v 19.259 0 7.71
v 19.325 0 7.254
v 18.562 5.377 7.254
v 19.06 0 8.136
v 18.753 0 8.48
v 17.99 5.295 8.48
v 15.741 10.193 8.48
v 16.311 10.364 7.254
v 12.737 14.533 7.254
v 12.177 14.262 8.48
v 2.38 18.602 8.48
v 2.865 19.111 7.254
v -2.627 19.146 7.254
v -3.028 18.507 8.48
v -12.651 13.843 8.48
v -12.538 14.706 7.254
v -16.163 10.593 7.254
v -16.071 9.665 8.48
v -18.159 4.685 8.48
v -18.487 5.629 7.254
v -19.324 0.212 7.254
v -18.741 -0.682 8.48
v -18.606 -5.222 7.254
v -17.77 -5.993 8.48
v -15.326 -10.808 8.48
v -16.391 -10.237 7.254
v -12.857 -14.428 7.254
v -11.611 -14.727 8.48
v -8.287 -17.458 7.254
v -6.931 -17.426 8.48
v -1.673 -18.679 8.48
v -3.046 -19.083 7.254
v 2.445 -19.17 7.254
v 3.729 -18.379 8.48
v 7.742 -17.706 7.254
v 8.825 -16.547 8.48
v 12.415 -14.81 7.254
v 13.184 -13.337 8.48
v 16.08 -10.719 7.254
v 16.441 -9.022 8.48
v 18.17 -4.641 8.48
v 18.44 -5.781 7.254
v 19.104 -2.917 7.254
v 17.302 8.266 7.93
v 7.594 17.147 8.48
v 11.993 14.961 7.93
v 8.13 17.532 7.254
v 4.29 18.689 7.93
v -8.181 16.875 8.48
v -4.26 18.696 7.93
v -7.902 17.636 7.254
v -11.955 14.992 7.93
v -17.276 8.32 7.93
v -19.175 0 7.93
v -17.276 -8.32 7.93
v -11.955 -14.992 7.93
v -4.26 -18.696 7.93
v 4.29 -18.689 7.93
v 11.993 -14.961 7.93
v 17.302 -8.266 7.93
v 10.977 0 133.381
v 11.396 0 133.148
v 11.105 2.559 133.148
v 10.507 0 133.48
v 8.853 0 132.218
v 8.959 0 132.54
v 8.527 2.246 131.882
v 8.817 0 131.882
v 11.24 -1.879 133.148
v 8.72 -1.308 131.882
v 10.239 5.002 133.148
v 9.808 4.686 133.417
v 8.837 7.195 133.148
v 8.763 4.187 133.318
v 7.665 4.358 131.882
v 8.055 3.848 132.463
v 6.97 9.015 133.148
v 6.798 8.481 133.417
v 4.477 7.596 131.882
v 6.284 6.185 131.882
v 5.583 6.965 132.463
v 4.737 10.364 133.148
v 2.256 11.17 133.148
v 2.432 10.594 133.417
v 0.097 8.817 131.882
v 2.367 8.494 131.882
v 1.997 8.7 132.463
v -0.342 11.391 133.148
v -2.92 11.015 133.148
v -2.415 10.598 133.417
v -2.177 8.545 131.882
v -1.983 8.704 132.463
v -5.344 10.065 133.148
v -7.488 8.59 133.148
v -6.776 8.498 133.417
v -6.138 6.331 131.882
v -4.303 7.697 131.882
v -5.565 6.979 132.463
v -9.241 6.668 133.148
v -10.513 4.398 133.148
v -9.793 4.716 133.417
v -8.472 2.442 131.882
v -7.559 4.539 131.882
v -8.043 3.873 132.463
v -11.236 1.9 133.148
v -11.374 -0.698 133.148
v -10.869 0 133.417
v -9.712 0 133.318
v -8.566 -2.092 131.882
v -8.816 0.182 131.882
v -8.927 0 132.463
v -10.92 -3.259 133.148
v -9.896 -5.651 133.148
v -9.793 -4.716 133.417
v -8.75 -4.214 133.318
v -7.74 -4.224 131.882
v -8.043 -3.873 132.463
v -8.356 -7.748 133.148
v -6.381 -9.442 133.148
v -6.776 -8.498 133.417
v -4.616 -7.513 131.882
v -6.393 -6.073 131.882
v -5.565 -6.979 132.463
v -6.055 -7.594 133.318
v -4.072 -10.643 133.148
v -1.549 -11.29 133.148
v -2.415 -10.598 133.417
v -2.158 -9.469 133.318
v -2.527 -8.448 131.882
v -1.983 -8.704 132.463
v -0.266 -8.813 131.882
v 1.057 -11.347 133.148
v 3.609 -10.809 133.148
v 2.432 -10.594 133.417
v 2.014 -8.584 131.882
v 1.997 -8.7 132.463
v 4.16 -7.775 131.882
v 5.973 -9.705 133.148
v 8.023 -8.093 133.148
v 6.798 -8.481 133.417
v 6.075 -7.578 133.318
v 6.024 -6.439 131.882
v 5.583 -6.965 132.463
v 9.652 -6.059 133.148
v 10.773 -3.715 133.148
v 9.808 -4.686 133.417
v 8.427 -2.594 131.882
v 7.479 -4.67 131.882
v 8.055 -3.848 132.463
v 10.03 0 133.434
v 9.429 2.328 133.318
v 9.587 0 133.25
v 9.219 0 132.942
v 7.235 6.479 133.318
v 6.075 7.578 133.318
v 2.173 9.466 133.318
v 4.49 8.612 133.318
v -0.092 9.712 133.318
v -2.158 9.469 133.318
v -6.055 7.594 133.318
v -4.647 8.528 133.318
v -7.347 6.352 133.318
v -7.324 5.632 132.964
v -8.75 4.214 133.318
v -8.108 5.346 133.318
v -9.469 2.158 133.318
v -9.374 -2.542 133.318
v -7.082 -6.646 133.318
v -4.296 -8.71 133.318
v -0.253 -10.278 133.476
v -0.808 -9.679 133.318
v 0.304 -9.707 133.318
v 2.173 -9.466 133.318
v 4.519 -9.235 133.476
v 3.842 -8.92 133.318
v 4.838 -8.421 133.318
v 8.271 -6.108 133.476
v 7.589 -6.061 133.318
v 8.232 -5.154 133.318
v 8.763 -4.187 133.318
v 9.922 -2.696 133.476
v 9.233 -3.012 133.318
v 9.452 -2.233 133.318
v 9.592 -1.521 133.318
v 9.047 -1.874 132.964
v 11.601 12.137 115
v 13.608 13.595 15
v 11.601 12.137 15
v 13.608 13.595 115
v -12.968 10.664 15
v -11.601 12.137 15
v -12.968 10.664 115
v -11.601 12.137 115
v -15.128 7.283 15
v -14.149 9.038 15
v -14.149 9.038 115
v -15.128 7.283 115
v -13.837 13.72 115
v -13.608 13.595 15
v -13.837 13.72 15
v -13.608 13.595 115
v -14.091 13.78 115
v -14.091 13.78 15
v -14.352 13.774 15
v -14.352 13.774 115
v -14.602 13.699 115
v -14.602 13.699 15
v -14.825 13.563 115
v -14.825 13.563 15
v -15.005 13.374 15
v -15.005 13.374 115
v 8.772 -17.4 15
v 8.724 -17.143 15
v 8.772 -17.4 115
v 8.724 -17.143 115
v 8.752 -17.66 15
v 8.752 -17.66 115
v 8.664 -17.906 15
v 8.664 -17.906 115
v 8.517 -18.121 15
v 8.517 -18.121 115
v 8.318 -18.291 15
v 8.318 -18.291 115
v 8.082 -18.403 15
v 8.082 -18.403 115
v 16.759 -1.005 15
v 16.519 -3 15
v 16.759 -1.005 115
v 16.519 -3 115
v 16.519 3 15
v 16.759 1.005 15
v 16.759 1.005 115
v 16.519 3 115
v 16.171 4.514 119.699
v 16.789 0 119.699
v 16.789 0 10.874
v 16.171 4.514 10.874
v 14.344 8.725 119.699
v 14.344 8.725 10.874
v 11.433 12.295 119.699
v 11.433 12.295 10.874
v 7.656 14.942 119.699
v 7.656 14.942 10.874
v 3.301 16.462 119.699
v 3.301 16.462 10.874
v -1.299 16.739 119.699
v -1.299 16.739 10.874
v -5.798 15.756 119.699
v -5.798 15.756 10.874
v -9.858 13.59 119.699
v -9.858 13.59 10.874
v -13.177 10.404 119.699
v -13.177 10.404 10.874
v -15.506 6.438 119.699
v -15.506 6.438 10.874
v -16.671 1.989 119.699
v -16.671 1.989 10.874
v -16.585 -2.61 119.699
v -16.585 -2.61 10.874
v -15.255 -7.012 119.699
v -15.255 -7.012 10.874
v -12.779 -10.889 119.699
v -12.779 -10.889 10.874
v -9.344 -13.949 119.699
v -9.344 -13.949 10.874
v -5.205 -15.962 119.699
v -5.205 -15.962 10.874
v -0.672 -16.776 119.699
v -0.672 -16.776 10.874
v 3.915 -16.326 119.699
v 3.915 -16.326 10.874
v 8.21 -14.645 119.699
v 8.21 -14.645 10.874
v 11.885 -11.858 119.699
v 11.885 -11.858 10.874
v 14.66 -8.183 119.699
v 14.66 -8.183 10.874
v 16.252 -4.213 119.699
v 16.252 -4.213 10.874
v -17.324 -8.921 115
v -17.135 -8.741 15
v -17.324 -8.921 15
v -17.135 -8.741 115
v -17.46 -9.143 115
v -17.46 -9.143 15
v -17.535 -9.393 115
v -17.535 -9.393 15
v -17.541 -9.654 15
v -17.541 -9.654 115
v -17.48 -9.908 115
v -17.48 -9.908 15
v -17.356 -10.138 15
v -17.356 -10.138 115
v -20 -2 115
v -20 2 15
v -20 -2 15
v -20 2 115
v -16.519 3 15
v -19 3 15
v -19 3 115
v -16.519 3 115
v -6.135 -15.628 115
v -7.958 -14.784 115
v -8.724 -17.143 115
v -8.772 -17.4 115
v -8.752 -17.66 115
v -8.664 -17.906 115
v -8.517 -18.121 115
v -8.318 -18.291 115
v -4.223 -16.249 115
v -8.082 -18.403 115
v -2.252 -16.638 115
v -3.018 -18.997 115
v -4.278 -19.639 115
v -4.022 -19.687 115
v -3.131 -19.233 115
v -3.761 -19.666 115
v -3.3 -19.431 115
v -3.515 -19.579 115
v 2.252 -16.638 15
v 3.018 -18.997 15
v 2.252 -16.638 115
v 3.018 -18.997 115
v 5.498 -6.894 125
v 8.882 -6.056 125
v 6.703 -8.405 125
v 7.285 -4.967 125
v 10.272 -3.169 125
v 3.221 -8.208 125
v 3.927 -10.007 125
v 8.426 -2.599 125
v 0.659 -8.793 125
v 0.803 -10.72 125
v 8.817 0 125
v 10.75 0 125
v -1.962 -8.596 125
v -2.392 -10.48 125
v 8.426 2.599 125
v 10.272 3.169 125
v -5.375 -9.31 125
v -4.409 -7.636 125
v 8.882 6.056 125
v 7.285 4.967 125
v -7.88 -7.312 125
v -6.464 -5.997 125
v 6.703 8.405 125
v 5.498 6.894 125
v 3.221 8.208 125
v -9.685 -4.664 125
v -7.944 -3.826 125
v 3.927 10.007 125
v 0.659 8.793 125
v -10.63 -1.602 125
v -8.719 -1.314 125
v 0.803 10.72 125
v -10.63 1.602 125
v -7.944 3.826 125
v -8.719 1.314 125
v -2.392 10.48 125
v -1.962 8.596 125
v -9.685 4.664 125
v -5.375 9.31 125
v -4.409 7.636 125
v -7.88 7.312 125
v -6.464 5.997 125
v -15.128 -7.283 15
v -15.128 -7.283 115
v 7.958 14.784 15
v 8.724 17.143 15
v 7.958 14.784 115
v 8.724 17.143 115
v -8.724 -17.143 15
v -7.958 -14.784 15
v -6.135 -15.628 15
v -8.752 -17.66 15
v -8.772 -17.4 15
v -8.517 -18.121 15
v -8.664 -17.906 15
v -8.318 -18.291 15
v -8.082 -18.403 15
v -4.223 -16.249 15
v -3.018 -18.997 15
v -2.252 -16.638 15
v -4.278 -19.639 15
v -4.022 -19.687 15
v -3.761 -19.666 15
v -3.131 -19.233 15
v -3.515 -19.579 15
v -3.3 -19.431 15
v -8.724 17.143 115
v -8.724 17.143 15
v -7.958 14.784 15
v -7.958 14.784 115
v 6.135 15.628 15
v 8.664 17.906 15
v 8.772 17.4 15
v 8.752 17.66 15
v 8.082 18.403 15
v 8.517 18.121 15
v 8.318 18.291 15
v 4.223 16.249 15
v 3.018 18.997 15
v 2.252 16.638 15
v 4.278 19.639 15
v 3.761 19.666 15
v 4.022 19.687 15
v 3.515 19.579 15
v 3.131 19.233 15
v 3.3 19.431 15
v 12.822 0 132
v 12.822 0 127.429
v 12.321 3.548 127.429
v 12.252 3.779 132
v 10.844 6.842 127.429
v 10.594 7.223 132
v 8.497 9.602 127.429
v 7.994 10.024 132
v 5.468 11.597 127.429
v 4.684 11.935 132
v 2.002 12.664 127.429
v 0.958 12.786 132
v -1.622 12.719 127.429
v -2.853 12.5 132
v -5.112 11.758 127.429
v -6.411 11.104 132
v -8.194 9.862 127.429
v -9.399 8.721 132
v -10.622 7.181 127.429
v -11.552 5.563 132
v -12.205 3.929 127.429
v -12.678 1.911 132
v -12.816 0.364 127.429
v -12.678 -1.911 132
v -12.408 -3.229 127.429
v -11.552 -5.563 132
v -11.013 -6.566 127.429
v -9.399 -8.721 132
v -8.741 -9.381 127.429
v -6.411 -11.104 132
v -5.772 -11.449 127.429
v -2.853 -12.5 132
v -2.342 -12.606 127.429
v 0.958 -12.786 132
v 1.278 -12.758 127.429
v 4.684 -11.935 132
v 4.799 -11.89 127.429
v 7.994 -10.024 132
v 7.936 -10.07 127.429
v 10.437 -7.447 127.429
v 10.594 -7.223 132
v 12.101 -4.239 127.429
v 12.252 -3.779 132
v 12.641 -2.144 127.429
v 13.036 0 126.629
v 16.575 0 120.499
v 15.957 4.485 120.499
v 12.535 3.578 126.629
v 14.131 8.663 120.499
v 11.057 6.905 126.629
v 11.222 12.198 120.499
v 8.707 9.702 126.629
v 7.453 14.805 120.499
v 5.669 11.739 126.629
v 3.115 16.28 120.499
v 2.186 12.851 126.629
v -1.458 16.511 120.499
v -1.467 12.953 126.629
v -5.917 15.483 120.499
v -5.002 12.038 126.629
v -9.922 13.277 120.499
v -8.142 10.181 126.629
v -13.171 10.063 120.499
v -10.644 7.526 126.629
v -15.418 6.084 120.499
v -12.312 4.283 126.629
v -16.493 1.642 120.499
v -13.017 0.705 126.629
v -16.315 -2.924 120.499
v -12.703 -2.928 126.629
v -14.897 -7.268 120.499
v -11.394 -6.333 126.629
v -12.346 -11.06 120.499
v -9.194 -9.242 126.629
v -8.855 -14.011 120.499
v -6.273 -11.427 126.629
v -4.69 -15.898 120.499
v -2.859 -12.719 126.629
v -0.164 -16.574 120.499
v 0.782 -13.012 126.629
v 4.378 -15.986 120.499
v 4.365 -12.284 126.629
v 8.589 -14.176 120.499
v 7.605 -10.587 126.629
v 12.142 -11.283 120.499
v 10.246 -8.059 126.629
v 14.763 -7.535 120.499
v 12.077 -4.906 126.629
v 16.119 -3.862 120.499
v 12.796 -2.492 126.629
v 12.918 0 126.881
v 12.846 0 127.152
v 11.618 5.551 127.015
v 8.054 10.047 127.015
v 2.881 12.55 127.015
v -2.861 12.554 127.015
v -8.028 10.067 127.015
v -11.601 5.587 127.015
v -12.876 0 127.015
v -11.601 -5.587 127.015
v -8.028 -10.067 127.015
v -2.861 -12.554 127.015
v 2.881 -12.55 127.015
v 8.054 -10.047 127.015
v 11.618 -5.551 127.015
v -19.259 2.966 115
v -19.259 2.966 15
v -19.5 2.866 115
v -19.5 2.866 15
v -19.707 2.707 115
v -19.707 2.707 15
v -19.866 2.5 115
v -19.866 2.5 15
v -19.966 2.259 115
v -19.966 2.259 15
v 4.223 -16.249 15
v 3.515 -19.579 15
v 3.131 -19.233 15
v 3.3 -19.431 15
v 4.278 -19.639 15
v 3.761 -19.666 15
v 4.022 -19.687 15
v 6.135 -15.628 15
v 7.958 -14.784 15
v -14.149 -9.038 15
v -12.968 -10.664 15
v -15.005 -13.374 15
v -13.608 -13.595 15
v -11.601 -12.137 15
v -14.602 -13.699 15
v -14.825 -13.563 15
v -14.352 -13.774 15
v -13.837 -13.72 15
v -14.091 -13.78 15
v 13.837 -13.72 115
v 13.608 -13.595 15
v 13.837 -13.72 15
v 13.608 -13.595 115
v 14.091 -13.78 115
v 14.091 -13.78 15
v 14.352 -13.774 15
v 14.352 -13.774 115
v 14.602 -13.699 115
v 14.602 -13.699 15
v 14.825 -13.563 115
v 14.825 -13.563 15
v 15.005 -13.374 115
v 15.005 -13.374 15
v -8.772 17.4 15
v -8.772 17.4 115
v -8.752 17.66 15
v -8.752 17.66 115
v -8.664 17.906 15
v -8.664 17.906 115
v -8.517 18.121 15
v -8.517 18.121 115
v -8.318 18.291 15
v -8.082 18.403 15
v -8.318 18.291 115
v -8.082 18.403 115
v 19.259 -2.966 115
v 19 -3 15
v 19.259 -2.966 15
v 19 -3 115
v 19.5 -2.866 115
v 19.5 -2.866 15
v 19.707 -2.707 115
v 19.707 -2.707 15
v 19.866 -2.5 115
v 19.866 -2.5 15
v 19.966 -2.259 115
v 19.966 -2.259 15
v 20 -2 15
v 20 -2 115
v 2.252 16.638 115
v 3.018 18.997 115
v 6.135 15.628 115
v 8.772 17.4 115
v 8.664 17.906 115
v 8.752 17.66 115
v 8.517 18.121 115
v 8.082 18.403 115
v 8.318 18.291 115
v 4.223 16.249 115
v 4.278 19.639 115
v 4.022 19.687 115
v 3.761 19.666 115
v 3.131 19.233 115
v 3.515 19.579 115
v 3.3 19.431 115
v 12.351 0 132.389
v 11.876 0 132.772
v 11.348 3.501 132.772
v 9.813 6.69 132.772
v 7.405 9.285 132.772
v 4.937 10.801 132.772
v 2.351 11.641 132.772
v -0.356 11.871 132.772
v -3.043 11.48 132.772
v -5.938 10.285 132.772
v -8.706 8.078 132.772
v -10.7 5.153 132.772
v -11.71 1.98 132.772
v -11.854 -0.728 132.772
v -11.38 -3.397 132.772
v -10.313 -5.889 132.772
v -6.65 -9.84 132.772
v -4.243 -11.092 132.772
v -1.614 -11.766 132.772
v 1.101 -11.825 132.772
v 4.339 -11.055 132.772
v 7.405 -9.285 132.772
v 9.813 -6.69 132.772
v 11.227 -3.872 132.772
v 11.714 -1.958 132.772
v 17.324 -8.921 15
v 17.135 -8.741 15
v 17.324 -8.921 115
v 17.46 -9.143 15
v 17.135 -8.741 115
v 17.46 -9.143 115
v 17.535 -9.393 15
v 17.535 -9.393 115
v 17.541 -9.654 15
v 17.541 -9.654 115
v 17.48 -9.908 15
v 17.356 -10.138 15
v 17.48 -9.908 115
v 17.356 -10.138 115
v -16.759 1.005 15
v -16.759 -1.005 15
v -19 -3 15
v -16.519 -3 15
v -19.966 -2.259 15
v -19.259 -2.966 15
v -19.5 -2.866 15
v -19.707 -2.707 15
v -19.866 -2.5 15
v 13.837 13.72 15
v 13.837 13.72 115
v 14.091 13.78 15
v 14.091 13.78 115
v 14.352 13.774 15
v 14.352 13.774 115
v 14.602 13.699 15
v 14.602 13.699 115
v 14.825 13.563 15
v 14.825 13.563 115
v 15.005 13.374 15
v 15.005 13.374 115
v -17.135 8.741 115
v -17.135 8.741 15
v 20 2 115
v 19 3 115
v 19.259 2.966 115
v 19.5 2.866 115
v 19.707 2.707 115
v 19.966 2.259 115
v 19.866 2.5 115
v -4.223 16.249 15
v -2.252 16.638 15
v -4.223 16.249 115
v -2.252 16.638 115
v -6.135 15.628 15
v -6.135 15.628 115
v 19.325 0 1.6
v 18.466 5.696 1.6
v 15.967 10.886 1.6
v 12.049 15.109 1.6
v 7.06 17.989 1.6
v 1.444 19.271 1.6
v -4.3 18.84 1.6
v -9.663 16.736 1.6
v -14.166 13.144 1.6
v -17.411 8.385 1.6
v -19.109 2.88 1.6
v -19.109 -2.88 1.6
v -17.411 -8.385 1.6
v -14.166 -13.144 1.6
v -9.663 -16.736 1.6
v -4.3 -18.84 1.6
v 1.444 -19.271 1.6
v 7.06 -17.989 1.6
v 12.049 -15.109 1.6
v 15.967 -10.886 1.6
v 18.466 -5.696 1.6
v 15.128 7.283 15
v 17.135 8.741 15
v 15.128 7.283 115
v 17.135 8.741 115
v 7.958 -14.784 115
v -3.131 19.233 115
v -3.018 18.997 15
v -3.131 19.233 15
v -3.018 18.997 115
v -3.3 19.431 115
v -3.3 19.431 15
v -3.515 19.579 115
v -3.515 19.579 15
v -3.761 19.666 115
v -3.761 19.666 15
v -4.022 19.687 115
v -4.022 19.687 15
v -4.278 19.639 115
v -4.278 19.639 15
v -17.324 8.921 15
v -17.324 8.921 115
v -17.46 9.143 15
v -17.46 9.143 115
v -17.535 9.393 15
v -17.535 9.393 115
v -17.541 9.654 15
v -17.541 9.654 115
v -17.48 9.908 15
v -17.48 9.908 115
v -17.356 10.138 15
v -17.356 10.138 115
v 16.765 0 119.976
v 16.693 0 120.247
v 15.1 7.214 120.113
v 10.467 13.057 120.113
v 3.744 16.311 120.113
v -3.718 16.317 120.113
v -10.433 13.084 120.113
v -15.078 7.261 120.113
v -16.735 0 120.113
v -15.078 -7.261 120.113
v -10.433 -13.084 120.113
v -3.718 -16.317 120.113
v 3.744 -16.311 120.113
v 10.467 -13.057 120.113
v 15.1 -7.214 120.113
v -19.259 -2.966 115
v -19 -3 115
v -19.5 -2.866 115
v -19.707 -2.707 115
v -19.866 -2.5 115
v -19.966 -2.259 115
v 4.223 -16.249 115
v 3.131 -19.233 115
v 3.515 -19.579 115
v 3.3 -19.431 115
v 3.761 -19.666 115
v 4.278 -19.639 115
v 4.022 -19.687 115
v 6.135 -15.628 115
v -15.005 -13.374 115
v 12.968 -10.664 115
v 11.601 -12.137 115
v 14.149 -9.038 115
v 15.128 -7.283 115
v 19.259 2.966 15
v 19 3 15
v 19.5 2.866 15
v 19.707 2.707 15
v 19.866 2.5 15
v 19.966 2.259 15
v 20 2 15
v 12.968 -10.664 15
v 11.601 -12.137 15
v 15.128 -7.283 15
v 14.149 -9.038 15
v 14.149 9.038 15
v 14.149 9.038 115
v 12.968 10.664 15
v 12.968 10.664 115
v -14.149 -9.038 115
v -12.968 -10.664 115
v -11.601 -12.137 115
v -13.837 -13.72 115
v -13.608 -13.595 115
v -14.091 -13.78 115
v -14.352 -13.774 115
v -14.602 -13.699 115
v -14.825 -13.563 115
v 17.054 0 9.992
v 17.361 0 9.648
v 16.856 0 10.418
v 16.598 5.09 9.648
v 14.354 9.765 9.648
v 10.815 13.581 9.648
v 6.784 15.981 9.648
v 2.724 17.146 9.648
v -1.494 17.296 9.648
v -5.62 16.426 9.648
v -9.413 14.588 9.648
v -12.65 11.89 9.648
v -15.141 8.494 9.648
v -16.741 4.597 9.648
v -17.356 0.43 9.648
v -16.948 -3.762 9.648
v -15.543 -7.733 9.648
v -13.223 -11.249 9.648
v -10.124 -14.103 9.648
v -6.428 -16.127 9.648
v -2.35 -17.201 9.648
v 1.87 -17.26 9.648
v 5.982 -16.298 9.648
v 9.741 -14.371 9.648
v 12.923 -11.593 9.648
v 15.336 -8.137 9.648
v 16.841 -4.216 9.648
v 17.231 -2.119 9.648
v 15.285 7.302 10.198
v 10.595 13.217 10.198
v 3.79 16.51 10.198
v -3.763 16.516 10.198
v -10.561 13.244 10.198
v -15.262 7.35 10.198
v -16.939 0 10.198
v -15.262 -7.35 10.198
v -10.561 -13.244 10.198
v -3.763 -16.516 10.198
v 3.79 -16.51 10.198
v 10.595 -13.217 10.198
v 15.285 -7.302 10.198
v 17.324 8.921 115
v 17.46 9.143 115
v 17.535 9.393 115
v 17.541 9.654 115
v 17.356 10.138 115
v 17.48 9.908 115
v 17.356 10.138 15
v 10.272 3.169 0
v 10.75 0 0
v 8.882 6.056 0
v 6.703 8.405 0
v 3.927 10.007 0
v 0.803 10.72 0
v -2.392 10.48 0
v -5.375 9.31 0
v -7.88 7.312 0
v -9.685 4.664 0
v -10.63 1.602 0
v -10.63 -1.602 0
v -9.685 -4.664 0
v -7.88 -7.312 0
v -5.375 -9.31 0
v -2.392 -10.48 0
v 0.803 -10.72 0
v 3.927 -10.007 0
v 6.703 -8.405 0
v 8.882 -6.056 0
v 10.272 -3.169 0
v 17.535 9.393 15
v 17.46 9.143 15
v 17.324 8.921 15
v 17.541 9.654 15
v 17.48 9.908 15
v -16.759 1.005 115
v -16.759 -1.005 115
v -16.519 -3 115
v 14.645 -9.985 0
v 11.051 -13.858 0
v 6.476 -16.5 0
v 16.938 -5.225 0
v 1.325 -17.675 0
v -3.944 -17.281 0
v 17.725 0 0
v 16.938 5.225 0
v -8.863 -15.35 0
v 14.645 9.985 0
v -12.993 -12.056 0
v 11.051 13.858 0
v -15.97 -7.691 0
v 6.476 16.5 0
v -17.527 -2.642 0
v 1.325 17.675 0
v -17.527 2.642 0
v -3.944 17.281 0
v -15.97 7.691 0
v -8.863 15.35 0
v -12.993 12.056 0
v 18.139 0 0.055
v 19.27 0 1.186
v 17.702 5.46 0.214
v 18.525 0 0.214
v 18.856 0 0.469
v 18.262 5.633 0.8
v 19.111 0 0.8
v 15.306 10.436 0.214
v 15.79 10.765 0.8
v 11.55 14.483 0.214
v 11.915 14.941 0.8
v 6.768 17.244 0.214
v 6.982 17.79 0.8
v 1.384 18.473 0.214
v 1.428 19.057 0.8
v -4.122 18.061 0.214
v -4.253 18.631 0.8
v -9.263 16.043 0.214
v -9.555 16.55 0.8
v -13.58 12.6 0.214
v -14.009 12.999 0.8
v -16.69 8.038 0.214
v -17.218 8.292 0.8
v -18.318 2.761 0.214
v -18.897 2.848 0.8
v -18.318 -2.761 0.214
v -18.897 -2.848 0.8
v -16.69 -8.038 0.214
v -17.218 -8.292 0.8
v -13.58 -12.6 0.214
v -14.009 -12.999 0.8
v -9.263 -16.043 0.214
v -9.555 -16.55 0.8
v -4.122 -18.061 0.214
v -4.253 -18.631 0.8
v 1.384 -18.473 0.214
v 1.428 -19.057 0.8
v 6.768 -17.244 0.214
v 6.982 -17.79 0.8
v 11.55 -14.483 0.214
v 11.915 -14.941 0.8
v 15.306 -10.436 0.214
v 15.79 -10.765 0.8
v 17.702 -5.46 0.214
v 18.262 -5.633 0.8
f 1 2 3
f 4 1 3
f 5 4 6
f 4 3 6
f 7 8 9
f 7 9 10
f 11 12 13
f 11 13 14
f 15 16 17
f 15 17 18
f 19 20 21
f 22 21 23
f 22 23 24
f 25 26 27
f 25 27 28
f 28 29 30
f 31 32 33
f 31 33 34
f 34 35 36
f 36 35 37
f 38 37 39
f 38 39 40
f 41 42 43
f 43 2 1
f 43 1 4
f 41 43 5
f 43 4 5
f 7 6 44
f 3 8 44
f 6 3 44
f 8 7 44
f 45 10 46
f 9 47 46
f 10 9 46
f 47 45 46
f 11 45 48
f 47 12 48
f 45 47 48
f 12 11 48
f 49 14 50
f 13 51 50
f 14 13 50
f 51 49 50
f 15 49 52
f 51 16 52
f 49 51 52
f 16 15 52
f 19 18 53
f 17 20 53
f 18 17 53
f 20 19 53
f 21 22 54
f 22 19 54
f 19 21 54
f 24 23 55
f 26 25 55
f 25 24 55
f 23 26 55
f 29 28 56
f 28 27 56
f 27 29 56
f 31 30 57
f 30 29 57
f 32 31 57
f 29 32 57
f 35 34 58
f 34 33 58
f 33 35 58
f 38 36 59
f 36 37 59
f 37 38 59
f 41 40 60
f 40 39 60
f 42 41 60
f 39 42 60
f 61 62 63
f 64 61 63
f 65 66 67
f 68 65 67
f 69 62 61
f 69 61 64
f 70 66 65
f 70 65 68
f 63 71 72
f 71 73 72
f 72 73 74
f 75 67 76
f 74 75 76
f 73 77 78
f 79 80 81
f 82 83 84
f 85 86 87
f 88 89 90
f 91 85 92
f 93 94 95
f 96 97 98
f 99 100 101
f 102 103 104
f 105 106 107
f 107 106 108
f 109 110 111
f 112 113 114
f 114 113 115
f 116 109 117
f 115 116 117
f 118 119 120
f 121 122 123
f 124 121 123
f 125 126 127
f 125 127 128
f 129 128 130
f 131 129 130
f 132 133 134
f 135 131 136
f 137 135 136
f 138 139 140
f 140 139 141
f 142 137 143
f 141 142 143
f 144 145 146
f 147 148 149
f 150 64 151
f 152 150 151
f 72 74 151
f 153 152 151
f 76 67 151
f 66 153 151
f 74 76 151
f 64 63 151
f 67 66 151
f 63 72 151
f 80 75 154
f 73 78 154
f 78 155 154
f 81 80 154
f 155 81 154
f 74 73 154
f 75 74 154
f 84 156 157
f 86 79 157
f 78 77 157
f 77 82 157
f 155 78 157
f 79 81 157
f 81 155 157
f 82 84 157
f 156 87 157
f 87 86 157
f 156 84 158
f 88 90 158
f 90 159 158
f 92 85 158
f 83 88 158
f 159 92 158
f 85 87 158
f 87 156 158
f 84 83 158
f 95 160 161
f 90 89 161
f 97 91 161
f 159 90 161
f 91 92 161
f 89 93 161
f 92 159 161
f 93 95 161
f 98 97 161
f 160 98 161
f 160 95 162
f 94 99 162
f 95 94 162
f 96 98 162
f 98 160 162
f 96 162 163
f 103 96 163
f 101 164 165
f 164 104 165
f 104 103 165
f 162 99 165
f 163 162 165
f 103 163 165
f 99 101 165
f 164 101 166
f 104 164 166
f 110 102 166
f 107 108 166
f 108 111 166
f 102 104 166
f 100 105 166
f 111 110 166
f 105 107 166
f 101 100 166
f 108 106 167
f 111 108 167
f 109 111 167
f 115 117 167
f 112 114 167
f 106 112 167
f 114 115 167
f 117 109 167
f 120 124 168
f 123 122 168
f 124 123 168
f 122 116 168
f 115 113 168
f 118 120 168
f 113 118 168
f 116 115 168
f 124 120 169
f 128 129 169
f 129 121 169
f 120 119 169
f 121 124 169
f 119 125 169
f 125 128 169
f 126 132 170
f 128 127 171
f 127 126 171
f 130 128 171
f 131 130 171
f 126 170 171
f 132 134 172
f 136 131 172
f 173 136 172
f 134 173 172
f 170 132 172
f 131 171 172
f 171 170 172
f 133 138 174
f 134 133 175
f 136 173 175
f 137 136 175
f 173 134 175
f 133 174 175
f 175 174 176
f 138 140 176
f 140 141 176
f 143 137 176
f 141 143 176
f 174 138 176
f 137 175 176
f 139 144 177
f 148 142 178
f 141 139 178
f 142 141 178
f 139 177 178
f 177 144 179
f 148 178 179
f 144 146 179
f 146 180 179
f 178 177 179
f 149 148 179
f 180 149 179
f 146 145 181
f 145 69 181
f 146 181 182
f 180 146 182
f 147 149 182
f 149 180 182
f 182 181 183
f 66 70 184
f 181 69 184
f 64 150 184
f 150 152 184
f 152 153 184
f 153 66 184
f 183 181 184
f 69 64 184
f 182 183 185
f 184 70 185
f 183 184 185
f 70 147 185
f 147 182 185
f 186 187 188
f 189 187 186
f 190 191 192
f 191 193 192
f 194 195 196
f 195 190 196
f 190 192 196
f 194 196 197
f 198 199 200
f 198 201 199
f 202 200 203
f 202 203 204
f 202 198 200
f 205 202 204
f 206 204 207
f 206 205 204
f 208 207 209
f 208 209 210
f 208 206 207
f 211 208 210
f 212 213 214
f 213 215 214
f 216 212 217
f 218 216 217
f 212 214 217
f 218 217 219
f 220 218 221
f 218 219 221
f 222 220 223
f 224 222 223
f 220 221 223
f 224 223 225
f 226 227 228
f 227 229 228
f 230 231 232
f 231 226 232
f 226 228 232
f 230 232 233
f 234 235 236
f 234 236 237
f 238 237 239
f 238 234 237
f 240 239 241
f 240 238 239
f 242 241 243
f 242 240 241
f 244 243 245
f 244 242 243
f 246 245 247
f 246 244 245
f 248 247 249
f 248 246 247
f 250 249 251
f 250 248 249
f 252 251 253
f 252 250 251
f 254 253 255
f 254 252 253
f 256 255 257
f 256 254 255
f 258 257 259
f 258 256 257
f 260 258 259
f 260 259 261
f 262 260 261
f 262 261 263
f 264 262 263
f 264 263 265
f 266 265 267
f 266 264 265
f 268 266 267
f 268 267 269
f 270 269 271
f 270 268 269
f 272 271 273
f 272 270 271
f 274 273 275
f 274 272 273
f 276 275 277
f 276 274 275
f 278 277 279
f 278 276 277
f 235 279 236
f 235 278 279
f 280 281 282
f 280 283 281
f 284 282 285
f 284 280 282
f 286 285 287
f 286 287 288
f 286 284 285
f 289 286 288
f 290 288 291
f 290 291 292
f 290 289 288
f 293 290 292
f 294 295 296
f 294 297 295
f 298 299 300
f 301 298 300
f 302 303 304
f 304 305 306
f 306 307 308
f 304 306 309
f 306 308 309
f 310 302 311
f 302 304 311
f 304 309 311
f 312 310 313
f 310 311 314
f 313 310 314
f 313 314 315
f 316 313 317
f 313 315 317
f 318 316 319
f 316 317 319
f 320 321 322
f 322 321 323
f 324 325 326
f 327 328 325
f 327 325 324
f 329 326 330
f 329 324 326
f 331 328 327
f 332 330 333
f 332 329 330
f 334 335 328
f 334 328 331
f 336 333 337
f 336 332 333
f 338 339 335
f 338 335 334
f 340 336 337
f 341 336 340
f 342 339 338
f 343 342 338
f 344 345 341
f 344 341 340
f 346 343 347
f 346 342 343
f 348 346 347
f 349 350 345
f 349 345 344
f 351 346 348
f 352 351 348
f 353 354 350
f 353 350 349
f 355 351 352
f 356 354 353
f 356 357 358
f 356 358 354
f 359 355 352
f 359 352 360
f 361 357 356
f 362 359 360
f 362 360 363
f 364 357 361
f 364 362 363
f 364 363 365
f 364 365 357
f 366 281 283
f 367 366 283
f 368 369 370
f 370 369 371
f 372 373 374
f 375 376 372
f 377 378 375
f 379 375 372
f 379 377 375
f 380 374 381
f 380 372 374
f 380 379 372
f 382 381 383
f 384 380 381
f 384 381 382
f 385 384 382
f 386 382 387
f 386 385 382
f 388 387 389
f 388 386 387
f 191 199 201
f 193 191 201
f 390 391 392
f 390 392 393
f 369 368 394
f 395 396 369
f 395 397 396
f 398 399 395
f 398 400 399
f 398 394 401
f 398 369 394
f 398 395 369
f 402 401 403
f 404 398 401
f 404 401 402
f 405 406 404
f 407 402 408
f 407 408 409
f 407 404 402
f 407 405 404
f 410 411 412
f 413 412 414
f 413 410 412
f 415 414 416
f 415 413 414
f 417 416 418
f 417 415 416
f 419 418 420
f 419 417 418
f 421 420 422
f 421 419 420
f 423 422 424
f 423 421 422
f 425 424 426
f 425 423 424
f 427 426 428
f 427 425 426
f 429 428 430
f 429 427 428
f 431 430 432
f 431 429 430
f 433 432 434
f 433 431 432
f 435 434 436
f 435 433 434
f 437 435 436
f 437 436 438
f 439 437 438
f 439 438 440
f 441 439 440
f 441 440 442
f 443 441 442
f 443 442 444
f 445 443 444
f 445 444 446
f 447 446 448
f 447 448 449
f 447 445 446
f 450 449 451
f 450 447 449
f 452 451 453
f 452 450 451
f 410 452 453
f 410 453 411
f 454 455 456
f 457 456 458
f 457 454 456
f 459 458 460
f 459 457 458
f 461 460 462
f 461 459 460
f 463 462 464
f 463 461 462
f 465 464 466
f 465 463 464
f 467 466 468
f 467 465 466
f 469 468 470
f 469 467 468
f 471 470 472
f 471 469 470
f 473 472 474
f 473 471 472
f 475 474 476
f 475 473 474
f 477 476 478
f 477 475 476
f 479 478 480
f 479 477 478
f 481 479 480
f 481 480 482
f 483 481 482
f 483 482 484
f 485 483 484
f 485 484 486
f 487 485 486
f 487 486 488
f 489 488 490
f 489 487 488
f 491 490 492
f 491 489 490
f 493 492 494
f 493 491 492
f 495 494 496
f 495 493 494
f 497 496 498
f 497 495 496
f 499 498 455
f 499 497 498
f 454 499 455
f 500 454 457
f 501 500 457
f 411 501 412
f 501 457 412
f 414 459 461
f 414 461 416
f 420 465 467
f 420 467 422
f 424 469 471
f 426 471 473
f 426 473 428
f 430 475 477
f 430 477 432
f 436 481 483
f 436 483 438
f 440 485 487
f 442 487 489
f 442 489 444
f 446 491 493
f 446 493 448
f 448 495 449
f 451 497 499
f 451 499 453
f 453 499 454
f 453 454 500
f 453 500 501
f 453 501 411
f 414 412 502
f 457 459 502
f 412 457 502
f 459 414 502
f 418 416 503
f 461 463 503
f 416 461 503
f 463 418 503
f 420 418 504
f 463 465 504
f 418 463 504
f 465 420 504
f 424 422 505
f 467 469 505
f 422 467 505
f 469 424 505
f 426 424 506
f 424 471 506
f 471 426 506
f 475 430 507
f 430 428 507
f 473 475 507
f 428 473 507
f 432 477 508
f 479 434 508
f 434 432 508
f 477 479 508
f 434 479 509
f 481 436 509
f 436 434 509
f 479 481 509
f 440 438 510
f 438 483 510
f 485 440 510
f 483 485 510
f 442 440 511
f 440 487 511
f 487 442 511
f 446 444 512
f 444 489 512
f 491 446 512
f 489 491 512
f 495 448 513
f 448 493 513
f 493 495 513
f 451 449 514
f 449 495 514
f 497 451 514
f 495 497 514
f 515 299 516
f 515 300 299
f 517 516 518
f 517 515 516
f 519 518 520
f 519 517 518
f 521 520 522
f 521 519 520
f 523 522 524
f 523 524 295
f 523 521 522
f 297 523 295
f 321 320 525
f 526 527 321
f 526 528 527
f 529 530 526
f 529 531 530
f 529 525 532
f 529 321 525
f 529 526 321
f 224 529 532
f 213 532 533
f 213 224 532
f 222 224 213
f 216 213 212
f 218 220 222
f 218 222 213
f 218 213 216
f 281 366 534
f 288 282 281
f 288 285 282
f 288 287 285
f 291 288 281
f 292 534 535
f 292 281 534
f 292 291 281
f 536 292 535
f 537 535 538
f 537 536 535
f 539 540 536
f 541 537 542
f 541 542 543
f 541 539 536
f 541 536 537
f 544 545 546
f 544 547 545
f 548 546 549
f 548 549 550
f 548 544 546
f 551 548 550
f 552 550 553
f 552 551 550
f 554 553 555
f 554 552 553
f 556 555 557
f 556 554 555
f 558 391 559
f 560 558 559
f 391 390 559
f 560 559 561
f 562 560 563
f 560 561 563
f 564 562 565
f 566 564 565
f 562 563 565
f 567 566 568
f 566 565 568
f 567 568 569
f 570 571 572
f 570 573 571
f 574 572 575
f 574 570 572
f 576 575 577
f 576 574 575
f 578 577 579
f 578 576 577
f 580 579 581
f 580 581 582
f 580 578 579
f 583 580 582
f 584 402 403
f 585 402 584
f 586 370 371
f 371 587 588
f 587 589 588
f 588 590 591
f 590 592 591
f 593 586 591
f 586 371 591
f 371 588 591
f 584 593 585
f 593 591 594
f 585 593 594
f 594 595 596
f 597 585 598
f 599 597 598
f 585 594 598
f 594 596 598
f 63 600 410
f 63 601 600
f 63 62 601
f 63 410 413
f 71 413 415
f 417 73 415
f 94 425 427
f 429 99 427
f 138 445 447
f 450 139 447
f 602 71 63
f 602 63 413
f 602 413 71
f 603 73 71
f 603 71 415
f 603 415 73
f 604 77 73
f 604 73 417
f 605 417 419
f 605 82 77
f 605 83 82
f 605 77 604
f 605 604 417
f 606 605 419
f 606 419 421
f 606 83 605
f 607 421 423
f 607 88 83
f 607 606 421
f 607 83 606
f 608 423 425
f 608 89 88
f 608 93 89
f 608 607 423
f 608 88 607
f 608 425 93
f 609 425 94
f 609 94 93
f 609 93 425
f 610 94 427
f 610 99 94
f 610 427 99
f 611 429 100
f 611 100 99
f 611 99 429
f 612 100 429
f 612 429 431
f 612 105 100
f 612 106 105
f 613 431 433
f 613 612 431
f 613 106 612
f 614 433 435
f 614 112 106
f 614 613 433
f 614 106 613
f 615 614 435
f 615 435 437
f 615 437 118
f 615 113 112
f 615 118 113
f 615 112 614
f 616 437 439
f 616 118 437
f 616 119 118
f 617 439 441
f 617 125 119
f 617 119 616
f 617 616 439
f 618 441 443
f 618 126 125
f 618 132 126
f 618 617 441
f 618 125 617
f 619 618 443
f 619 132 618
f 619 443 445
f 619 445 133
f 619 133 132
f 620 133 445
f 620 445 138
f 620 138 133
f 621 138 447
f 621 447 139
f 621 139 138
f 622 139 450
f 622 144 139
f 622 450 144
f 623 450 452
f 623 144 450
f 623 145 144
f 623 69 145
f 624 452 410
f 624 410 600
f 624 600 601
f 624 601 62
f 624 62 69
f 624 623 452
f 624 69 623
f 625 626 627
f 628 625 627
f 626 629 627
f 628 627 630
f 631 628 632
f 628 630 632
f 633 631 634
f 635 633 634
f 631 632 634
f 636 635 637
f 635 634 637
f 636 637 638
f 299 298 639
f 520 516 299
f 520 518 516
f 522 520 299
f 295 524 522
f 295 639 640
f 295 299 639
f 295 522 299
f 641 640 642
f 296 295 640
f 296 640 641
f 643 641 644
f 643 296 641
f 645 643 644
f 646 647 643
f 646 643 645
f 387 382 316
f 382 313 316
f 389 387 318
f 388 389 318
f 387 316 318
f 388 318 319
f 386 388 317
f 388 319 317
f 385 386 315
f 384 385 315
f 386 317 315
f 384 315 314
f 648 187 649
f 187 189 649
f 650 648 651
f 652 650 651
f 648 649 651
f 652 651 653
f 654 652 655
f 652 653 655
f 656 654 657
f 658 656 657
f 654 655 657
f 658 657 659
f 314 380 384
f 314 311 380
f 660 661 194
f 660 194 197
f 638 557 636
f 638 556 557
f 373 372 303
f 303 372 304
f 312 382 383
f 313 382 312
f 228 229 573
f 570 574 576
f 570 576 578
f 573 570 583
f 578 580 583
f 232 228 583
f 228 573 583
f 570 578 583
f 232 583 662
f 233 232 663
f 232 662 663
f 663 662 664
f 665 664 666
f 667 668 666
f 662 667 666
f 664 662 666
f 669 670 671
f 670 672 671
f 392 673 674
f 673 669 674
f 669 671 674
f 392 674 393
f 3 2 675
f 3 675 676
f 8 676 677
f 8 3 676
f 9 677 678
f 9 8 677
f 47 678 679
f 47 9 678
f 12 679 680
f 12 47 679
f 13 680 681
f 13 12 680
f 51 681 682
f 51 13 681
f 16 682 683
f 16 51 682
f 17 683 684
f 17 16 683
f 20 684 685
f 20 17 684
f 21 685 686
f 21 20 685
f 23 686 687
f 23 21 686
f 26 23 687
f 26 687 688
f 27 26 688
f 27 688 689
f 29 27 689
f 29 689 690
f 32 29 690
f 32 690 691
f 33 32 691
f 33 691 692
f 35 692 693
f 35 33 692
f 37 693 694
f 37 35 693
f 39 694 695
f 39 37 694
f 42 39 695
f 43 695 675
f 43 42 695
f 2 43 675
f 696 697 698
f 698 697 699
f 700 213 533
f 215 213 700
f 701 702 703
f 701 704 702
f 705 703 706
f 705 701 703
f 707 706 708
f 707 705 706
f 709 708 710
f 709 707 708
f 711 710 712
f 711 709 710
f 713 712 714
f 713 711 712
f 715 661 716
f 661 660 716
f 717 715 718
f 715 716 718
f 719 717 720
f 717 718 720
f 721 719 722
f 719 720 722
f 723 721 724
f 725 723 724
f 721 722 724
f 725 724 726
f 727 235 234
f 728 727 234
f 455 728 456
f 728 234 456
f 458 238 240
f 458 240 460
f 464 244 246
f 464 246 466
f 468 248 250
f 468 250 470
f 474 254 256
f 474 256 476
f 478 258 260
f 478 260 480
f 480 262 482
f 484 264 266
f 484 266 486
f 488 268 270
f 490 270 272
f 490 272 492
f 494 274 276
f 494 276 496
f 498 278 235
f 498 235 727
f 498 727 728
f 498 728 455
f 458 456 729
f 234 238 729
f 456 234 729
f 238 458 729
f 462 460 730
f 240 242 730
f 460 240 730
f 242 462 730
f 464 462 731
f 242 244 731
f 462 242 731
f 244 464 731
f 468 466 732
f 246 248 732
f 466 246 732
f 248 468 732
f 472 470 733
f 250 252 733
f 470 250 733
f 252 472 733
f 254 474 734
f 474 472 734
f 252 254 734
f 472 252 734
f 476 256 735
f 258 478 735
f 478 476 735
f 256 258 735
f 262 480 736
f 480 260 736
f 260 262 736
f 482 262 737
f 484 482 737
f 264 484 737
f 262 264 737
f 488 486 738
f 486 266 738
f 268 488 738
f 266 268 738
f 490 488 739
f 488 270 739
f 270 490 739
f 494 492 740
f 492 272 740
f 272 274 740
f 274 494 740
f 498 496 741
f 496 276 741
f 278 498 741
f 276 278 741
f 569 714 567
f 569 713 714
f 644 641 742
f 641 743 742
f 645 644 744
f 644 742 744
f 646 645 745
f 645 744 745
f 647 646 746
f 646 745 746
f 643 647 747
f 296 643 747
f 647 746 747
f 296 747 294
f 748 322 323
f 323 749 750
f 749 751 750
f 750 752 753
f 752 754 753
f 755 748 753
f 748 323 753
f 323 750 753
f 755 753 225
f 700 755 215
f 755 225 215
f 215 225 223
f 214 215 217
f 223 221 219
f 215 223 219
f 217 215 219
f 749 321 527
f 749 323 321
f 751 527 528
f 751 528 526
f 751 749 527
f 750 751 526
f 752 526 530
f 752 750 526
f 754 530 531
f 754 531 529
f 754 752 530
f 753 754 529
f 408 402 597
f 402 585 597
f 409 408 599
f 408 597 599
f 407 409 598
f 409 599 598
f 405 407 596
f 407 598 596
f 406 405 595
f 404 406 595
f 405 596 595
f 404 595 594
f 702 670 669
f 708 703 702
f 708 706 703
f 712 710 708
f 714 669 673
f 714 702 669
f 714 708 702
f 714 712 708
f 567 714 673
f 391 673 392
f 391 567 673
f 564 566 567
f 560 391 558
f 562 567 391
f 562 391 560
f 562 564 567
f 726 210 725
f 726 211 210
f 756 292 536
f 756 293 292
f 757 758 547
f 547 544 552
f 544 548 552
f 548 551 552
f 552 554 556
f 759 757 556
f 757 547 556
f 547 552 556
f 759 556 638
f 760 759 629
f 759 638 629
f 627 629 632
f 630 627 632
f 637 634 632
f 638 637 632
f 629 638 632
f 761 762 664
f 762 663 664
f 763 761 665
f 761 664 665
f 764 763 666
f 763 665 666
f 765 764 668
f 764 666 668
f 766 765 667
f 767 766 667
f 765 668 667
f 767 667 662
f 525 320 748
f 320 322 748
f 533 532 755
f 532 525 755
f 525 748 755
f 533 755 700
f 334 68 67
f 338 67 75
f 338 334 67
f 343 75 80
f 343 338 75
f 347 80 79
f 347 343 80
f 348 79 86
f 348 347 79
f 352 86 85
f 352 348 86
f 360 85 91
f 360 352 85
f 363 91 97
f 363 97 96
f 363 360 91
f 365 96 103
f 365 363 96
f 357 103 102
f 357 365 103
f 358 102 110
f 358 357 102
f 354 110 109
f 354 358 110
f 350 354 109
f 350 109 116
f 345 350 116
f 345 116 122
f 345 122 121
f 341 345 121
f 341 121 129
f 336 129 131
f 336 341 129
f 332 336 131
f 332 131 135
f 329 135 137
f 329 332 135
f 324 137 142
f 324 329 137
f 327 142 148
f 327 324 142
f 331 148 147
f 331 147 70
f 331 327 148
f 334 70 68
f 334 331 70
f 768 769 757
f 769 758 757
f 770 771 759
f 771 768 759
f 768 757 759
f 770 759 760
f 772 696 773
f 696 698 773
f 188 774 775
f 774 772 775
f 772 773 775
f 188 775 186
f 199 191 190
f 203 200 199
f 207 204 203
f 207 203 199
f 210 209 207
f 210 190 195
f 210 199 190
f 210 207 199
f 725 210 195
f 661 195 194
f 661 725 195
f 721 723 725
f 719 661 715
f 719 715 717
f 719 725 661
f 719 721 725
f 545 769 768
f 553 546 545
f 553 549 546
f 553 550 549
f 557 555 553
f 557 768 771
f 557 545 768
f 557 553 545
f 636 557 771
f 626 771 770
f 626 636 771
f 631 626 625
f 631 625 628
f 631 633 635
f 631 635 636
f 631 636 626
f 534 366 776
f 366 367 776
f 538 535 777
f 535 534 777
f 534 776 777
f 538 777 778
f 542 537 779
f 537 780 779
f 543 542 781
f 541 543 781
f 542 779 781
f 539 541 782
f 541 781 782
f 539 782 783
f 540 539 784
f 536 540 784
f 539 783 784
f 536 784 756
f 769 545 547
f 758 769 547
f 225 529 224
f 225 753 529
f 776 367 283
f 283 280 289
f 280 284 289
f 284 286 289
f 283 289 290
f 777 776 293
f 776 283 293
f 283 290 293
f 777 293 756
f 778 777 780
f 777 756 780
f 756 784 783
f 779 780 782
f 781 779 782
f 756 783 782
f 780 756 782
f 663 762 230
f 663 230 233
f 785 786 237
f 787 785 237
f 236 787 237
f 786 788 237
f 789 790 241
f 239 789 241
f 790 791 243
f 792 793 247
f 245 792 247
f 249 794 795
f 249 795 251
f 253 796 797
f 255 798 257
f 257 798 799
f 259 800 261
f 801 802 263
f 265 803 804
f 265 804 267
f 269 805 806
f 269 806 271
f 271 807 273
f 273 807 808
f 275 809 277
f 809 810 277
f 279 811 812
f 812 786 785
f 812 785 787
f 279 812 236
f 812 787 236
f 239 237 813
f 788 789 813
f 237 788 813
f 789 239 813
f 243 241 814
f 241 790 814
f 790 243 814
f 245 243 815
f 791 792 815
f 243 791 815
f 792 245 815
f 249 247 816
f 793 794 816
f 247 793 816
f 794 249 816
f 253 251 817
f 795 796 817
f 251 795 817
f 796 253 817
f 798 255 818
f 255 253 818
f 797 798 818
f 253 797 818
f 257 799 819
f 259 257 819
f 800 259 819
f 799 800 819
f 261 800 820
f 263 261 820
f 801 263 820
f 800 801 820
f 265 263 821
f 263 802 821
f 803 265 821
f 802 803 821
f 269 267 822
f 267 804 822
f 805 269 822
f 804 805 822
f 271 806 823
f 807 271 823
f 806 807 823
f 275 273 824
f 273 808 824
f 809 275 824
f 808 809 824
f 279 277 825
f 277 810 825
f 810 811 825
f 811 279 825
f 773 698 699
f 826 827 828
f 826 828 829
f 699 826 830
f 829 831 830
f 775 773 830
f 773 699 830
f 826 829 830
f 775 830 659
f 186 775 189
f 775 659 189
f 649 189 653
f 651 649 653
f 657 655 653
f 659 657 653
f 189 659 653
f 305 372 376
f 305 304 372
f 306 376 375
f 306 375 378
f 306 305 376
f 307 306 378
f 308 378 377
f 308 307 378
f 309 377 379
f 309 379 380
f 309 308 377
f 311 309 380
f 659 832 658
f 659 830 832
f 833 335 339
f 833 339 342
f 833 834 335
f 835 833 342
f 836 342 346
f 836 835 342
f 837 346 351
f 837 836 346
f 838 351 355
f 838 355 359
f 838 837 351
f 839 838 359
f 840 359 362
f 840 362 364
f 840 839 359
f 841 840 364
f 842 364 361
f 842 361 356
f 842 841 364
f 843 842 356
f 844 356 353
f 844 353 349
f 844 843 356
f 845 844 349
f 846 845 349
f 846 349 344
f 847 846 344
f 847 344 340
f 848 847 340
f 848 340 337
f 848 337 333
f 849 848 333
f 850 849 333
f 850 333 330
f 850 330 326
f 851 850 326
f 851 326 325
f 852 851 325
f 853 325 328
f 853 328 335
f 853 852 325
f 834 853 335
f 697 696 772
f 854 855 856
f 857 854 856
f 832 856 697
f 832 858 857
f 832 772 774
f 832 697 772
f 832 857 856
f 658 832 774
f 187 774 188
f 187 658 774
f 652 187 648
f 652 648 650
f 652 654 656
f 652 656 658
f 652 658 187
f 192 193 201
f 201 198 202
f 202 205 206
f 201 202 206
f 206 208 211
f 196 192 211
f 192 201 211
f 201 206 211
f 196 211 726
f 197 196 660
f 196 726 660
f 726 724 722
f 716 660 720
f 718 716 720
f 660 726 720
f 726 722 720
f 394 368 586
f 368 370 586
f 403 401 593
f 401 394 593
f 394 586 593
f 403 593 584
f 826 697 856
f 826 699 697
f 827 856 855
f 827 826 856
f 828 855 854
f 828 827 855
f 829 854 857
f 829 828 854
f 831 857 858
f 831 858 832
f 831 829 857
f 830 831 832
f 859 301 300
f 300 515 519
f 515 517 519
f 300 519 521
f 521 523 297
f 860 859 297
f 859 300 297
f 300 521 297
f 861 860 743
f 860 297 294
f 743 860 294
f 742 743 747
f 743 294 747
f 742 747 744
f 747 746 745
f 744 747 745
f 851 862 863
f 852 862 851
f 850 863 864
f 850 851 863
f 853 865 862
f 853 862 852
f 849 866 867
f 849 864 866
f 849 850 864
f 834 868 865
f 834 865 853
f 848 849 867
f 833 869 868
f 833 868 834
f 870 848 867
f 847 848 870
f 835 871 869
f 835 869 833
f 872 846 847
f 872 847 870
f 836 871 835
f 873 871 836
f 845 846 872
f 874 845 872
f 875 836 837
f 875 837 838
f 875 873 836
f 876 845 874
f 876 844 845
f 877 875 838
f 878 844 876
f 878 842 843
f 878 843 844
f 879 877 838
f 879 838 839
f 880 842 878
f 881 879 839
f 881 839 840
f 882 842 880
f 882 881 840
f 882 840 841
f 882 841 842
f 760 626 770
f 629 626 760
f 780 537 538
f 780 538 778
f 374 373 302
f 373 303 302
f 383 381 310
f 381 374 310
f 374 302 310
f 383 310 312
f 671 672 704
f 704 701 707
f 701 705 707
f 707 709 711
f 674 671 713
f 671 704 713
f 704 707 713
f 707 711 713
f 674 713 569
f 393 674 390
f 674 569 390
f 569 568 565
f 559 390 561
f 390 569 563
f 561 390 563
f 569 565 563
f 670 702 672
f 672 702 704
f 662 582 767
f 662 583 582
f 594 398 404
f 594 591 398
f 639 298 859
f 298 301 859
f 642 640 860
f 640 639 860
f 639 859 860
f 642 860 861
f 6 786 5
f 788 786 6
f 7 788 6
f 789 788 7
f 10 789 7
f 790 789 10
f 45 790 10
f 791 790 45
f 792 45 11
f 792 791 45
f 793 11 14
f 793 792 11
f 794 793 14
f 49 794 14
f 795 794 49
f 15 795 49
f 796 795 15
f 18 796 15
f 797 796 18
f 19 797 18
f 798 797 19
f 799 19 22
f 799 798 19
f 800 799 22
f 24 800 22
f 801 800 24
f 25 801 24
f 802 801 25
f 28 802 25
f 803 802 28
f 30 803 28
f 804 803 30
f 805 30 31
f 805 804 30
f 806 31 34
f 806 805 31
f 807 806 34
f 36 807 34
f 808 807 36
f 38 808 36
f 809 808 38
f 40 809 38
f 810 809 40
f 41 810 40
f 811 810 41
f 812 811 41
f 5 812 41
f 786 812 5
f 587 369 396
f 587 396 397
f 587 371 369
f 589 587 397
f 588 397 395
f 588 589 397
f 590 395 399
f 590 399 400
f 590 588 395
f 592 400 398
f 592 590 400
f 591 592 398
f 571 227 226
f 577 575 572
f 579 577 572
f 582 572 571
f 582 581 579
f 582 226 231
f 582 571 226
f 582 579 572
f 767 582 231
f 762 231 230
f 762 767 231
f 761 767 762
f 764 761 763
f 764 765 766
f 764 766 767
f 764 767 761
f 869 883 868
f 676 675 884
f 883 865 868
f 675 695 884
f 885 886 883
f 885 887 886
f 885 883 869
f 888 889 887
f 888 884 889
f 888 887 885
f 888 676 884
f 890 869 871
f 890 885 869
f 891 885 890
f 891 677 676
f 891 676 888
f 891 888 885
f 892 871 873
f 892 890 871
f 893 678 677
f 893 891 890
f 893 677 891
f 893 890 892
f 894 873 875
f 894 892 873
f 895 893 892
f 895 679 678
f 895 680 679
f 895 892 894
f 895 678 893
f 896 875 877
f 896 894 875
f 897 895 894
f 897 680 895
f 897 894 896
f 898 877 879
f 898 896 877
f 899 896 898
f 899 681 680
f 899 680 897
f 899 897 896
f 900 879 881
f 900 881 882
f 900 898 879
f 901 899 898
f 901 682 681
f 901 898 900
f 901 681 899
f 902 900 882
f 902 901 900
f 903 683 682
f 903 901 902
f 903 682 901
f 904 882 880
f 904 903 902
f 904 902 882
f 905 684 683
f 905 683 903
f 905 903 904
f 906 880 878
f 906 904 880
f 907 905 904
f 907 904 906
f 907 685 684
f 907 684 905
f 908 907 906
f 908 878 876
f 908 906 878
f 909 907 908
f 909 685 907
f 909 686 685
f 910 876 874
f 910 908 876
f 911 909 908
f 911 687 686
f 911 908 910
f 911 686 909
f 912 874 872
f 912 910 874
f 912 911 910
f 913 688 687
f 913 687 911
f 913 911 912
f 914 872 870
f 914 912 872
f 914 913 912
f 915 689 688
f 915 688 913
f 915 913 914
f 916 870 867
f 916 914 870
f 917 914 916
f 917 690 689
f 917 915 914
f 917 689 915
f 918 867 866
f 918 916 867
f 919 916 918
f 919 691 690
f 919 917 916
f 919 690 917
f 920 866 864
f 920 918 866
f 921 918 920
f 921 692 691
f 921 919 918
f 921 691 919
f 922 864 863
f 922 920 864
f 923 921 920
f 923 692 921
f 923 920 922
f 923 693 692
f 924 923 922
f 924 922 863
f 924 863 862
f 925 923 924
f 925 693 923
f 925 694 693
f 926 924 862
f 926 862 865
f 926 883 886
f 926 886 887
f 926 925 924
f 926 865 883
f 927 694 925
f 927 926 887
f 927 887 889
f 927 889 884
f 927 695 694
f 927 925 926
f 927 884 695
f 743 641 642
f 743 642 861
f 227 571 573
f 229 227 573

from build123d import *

# Parameters (mm, degrees)
F2_R            = 1.6
F4_W            = 6
F4_H            = 100
F5_COPIES_COUNT = 10
F6_R            = 1
F6_2_R          = 1
F6_3_R          = 1
F6_4_R          = 1
F6_5_R          = 1
F6_6_R          = 1
F6_7_R          = 1
F6_8_R          = 1
F6_9_R          = 1
F6_10_R         = 1


# Not quite as in the source:
# - a feature of the source that left no trace in its solid (it failed there, or was rolled back) is left out
# - a pattern or mirror of a feature is missing from the dataset's text; its kind, count and spacing are read off the source's solid


with BuildPart() as f1:
    # F0 (on Front) → F1 (revolve)
    with BuildSketch(Plane.XZ):
        with BuildLine():
            Line((10.75, 125), (10.75, 0))
            Line((10.75, 0), (19.325, 0))
            Line((19.325, 0), (19.325, 8))
            Line((19.325, 8), (16.7893237613, 10.1276849967))
            Line((16.7893237613, 10.1276849967), (16.7893237613, 120.1276849967))
            Line((16.7893237613, 120.1276849967), (12.8215908442, 127))
            Line((12.8215908442, 127), (12.8215908442, 132))
            ThreePointArc((12.8215908442, 132), (10.860884629, 133.5551954835), (8.8174703872, 135))
            Line((8.8174703872, 135), (8.8174703872, 125))
            Line((8.8174703872, 125), (10.75, 125))
        make_face()
    revolve(axis=Axis((0, 0, 18.1783709021), (0, 0, 1)))

    # F2
    f2_edges = [f1.edges().sort_by_distance(p)[0] for p in [
        (-8.81747, 0, 135),
        (-12.821591, 0, 127),
        (-16.789324, 0, 120.127685),
        (-16.789324, 0, 10.127685),
        (-19.325, 0, 8),
        (-19.325, 0, 0),
    ]]
    fillet(f2_edges, radius=F2_R)


with BuildPart() as f5:
    # F4 (on offset) → F5 (new body, up to the next surface of F1)
    with BuildSketch(Plane.YZ.offset(20)):
        with Locations((0, 65)):
            Rectangle(F4_W, F4_H)
    extrude(until=Until.NEXT, target=f1.part, dir=(-1, 0, 0))


with BuildPart() as f5_copies_1:
    # F5_copies: instance of F5
    add(f5.part.rotate(Axis((0, 0, 0), (0, 0, 1)), 1 * 360 / F5_COPIES_COUNT))

    # F6#2
    f6_2_edges = [f5_copies_1.edges().sort_by_distance(p)[0] for p in [
        (17.943696, 9.328654, 65),
        (14.416984, 14.182756, 65),
    ]]
    fillet(f6_2_edges, radius=F6_2_R)


with BuildPart() as f5_copies_2:
    # F5_copies: instance of F5
    add(f5.part.rotate(Axis((0, 0, 0), (0, 0, 1)), 2 * 360 / F5_COPIES_COUNT))

    # F6#3
    f6_3_edges = [f5_copies_2.edges().sort_by_distance(p)[0] for p in [
        (9.033509, 18.094079, 65),
        (3.32717, 19.948181, 65),
    ]]
    fillet(f6_3_edges, radius=F6_3_R)


with BuildPart() as f5_copies_3:
    # F5_copies: instance of F5
    add(f5.part.rotate(Axis((0, 0, 0), (0, 0, 1)), 3 * 360 / F5_COPIES_COUNT))

    # F6#4
    f6_4_edges = [f5_copies_3.edges().sort_by_distance(p)[0] for p in [
        (-3.32717, 19.948181, 65),
        (-9.033509, 18.094079, 65),
    ]]
    fillet(f6_4_edges, radius=F6_4_R)


with BuildPart() as f5_copies_4:
    # F5_copies: instance of F5
    add(f5.part.rotate(Axis((0, 0, 0), (0, 0, 1)), 4 * 360 / F5_COPIES_COUNT))

    # F6#5
    f6_5_edges = [f5_copies_4.edges().sort_by_distance(p)[0] for p in [
        (-14.416984, 14.182756, 65),
        (-17.943696, 9.328654, 65),
    ]]
    fillet(f6_5_edges, radius=F6_5_R)


with BuildPart() as f5_copies_5:
    # F5_copies: instance of F5
    add(f5.part.rotate(Axis((0, 0, 0), (0, 0, 1)), 5 * 360 / F5_COPIES_COUNT))

    # F6#6
    f6_6_edges = [f5_copies_5.edges().sort_by_distance(p)[0] for p in [
        (-20, 3, 65),
        (-20, -3, 65),
    ]]
    fillet(f6_6_edges, radius=F6_6_R)


with BuildPart() as f5_copies_6:
    # F5_copies: instance of F5
    add(f5.part.rotate(Axis((0, 0, 0), (0, 0, 1)), 6 * 360 / F5_COPIES_COUNT))

    # F6#7
    f6_7_edges = [f5_copies_6.edges().sort_by_distance(p)[0] for p in [
        (-17.943696, -9.328654, 65),
        (-14.416984, -14.182756, 65),
    ]]
    fillet(f6_7_edges, radius=F6_7_R)


with BuildPart() as f5_copies_7:
    # F5_copies: instance of F5
    add(f5.part.rotate(Axis((0, 0, 0), (0, 0, 1)), 7 * 360 / F5_COPIES_COUNT))

    # F6#8
    f6_8_edges = [f5_copies_7.edges().sort_by_distance(p)[0] for p in [
        (-9.033509, -18.094079, 65),
        (-3.32717, -19.948181, 65),
    ]]
    fillet(f6_8_edges, radius=F6_8_R)


with BuildPart() as f5_copies_8:
    # F5_copies: instance of F5
    add(f5.part.rotate(Axis((0, 0, 0), (0, 0, 1)), 8 * 360 / F5_COPIES_COUNT))

    # F6#9
    f6_9_edges = [f5_copies_8.edges().sort_by_distance(p)[0] for p in [
        (3.32717, -19.948181, 65),
        (9.033509, -18.094079, 65),
    ]]
    fillet(f6_9_edges, radius=F6_9_R)


with BuildPart() as f5_copies_9:
    # F5_copies: instance of F5
    add(f5.part.rotate(Axis((0, 0, 0), (0, 0, 1)), 9 * 360 / F5_COPIES_COUNT))

    # F6#10
    f6_10_edges = [f5_copies_9.edges().sort_by_distance(p)[0] for p in [
        (14.416984, -14.182756, 65),
        (17.943696, -9.328654, 65),
    ]]
    fillet(f6_10_edges, radius=F6_10_R)


with BuildPart() as f5_1:
    add(f5.part)

    # F6
    f6_edges = [f5_1.edges().sort_by_distance(p)[0] for p in [
        (20, -3, 65),
        (20, 3, 65),
    ]]
    fillet(f6_edges, radius=F6_R)


solid = Compound([f1.part, f5_copies_1.part, f5_copies_2.part, f5_copies_3.part, f5_copies_4.part, f5_copies_5.part, f5_copies_6.part, f5_copies_7.part, f5_copies_8.part, f5_copies_9.part, f5_1.part])
